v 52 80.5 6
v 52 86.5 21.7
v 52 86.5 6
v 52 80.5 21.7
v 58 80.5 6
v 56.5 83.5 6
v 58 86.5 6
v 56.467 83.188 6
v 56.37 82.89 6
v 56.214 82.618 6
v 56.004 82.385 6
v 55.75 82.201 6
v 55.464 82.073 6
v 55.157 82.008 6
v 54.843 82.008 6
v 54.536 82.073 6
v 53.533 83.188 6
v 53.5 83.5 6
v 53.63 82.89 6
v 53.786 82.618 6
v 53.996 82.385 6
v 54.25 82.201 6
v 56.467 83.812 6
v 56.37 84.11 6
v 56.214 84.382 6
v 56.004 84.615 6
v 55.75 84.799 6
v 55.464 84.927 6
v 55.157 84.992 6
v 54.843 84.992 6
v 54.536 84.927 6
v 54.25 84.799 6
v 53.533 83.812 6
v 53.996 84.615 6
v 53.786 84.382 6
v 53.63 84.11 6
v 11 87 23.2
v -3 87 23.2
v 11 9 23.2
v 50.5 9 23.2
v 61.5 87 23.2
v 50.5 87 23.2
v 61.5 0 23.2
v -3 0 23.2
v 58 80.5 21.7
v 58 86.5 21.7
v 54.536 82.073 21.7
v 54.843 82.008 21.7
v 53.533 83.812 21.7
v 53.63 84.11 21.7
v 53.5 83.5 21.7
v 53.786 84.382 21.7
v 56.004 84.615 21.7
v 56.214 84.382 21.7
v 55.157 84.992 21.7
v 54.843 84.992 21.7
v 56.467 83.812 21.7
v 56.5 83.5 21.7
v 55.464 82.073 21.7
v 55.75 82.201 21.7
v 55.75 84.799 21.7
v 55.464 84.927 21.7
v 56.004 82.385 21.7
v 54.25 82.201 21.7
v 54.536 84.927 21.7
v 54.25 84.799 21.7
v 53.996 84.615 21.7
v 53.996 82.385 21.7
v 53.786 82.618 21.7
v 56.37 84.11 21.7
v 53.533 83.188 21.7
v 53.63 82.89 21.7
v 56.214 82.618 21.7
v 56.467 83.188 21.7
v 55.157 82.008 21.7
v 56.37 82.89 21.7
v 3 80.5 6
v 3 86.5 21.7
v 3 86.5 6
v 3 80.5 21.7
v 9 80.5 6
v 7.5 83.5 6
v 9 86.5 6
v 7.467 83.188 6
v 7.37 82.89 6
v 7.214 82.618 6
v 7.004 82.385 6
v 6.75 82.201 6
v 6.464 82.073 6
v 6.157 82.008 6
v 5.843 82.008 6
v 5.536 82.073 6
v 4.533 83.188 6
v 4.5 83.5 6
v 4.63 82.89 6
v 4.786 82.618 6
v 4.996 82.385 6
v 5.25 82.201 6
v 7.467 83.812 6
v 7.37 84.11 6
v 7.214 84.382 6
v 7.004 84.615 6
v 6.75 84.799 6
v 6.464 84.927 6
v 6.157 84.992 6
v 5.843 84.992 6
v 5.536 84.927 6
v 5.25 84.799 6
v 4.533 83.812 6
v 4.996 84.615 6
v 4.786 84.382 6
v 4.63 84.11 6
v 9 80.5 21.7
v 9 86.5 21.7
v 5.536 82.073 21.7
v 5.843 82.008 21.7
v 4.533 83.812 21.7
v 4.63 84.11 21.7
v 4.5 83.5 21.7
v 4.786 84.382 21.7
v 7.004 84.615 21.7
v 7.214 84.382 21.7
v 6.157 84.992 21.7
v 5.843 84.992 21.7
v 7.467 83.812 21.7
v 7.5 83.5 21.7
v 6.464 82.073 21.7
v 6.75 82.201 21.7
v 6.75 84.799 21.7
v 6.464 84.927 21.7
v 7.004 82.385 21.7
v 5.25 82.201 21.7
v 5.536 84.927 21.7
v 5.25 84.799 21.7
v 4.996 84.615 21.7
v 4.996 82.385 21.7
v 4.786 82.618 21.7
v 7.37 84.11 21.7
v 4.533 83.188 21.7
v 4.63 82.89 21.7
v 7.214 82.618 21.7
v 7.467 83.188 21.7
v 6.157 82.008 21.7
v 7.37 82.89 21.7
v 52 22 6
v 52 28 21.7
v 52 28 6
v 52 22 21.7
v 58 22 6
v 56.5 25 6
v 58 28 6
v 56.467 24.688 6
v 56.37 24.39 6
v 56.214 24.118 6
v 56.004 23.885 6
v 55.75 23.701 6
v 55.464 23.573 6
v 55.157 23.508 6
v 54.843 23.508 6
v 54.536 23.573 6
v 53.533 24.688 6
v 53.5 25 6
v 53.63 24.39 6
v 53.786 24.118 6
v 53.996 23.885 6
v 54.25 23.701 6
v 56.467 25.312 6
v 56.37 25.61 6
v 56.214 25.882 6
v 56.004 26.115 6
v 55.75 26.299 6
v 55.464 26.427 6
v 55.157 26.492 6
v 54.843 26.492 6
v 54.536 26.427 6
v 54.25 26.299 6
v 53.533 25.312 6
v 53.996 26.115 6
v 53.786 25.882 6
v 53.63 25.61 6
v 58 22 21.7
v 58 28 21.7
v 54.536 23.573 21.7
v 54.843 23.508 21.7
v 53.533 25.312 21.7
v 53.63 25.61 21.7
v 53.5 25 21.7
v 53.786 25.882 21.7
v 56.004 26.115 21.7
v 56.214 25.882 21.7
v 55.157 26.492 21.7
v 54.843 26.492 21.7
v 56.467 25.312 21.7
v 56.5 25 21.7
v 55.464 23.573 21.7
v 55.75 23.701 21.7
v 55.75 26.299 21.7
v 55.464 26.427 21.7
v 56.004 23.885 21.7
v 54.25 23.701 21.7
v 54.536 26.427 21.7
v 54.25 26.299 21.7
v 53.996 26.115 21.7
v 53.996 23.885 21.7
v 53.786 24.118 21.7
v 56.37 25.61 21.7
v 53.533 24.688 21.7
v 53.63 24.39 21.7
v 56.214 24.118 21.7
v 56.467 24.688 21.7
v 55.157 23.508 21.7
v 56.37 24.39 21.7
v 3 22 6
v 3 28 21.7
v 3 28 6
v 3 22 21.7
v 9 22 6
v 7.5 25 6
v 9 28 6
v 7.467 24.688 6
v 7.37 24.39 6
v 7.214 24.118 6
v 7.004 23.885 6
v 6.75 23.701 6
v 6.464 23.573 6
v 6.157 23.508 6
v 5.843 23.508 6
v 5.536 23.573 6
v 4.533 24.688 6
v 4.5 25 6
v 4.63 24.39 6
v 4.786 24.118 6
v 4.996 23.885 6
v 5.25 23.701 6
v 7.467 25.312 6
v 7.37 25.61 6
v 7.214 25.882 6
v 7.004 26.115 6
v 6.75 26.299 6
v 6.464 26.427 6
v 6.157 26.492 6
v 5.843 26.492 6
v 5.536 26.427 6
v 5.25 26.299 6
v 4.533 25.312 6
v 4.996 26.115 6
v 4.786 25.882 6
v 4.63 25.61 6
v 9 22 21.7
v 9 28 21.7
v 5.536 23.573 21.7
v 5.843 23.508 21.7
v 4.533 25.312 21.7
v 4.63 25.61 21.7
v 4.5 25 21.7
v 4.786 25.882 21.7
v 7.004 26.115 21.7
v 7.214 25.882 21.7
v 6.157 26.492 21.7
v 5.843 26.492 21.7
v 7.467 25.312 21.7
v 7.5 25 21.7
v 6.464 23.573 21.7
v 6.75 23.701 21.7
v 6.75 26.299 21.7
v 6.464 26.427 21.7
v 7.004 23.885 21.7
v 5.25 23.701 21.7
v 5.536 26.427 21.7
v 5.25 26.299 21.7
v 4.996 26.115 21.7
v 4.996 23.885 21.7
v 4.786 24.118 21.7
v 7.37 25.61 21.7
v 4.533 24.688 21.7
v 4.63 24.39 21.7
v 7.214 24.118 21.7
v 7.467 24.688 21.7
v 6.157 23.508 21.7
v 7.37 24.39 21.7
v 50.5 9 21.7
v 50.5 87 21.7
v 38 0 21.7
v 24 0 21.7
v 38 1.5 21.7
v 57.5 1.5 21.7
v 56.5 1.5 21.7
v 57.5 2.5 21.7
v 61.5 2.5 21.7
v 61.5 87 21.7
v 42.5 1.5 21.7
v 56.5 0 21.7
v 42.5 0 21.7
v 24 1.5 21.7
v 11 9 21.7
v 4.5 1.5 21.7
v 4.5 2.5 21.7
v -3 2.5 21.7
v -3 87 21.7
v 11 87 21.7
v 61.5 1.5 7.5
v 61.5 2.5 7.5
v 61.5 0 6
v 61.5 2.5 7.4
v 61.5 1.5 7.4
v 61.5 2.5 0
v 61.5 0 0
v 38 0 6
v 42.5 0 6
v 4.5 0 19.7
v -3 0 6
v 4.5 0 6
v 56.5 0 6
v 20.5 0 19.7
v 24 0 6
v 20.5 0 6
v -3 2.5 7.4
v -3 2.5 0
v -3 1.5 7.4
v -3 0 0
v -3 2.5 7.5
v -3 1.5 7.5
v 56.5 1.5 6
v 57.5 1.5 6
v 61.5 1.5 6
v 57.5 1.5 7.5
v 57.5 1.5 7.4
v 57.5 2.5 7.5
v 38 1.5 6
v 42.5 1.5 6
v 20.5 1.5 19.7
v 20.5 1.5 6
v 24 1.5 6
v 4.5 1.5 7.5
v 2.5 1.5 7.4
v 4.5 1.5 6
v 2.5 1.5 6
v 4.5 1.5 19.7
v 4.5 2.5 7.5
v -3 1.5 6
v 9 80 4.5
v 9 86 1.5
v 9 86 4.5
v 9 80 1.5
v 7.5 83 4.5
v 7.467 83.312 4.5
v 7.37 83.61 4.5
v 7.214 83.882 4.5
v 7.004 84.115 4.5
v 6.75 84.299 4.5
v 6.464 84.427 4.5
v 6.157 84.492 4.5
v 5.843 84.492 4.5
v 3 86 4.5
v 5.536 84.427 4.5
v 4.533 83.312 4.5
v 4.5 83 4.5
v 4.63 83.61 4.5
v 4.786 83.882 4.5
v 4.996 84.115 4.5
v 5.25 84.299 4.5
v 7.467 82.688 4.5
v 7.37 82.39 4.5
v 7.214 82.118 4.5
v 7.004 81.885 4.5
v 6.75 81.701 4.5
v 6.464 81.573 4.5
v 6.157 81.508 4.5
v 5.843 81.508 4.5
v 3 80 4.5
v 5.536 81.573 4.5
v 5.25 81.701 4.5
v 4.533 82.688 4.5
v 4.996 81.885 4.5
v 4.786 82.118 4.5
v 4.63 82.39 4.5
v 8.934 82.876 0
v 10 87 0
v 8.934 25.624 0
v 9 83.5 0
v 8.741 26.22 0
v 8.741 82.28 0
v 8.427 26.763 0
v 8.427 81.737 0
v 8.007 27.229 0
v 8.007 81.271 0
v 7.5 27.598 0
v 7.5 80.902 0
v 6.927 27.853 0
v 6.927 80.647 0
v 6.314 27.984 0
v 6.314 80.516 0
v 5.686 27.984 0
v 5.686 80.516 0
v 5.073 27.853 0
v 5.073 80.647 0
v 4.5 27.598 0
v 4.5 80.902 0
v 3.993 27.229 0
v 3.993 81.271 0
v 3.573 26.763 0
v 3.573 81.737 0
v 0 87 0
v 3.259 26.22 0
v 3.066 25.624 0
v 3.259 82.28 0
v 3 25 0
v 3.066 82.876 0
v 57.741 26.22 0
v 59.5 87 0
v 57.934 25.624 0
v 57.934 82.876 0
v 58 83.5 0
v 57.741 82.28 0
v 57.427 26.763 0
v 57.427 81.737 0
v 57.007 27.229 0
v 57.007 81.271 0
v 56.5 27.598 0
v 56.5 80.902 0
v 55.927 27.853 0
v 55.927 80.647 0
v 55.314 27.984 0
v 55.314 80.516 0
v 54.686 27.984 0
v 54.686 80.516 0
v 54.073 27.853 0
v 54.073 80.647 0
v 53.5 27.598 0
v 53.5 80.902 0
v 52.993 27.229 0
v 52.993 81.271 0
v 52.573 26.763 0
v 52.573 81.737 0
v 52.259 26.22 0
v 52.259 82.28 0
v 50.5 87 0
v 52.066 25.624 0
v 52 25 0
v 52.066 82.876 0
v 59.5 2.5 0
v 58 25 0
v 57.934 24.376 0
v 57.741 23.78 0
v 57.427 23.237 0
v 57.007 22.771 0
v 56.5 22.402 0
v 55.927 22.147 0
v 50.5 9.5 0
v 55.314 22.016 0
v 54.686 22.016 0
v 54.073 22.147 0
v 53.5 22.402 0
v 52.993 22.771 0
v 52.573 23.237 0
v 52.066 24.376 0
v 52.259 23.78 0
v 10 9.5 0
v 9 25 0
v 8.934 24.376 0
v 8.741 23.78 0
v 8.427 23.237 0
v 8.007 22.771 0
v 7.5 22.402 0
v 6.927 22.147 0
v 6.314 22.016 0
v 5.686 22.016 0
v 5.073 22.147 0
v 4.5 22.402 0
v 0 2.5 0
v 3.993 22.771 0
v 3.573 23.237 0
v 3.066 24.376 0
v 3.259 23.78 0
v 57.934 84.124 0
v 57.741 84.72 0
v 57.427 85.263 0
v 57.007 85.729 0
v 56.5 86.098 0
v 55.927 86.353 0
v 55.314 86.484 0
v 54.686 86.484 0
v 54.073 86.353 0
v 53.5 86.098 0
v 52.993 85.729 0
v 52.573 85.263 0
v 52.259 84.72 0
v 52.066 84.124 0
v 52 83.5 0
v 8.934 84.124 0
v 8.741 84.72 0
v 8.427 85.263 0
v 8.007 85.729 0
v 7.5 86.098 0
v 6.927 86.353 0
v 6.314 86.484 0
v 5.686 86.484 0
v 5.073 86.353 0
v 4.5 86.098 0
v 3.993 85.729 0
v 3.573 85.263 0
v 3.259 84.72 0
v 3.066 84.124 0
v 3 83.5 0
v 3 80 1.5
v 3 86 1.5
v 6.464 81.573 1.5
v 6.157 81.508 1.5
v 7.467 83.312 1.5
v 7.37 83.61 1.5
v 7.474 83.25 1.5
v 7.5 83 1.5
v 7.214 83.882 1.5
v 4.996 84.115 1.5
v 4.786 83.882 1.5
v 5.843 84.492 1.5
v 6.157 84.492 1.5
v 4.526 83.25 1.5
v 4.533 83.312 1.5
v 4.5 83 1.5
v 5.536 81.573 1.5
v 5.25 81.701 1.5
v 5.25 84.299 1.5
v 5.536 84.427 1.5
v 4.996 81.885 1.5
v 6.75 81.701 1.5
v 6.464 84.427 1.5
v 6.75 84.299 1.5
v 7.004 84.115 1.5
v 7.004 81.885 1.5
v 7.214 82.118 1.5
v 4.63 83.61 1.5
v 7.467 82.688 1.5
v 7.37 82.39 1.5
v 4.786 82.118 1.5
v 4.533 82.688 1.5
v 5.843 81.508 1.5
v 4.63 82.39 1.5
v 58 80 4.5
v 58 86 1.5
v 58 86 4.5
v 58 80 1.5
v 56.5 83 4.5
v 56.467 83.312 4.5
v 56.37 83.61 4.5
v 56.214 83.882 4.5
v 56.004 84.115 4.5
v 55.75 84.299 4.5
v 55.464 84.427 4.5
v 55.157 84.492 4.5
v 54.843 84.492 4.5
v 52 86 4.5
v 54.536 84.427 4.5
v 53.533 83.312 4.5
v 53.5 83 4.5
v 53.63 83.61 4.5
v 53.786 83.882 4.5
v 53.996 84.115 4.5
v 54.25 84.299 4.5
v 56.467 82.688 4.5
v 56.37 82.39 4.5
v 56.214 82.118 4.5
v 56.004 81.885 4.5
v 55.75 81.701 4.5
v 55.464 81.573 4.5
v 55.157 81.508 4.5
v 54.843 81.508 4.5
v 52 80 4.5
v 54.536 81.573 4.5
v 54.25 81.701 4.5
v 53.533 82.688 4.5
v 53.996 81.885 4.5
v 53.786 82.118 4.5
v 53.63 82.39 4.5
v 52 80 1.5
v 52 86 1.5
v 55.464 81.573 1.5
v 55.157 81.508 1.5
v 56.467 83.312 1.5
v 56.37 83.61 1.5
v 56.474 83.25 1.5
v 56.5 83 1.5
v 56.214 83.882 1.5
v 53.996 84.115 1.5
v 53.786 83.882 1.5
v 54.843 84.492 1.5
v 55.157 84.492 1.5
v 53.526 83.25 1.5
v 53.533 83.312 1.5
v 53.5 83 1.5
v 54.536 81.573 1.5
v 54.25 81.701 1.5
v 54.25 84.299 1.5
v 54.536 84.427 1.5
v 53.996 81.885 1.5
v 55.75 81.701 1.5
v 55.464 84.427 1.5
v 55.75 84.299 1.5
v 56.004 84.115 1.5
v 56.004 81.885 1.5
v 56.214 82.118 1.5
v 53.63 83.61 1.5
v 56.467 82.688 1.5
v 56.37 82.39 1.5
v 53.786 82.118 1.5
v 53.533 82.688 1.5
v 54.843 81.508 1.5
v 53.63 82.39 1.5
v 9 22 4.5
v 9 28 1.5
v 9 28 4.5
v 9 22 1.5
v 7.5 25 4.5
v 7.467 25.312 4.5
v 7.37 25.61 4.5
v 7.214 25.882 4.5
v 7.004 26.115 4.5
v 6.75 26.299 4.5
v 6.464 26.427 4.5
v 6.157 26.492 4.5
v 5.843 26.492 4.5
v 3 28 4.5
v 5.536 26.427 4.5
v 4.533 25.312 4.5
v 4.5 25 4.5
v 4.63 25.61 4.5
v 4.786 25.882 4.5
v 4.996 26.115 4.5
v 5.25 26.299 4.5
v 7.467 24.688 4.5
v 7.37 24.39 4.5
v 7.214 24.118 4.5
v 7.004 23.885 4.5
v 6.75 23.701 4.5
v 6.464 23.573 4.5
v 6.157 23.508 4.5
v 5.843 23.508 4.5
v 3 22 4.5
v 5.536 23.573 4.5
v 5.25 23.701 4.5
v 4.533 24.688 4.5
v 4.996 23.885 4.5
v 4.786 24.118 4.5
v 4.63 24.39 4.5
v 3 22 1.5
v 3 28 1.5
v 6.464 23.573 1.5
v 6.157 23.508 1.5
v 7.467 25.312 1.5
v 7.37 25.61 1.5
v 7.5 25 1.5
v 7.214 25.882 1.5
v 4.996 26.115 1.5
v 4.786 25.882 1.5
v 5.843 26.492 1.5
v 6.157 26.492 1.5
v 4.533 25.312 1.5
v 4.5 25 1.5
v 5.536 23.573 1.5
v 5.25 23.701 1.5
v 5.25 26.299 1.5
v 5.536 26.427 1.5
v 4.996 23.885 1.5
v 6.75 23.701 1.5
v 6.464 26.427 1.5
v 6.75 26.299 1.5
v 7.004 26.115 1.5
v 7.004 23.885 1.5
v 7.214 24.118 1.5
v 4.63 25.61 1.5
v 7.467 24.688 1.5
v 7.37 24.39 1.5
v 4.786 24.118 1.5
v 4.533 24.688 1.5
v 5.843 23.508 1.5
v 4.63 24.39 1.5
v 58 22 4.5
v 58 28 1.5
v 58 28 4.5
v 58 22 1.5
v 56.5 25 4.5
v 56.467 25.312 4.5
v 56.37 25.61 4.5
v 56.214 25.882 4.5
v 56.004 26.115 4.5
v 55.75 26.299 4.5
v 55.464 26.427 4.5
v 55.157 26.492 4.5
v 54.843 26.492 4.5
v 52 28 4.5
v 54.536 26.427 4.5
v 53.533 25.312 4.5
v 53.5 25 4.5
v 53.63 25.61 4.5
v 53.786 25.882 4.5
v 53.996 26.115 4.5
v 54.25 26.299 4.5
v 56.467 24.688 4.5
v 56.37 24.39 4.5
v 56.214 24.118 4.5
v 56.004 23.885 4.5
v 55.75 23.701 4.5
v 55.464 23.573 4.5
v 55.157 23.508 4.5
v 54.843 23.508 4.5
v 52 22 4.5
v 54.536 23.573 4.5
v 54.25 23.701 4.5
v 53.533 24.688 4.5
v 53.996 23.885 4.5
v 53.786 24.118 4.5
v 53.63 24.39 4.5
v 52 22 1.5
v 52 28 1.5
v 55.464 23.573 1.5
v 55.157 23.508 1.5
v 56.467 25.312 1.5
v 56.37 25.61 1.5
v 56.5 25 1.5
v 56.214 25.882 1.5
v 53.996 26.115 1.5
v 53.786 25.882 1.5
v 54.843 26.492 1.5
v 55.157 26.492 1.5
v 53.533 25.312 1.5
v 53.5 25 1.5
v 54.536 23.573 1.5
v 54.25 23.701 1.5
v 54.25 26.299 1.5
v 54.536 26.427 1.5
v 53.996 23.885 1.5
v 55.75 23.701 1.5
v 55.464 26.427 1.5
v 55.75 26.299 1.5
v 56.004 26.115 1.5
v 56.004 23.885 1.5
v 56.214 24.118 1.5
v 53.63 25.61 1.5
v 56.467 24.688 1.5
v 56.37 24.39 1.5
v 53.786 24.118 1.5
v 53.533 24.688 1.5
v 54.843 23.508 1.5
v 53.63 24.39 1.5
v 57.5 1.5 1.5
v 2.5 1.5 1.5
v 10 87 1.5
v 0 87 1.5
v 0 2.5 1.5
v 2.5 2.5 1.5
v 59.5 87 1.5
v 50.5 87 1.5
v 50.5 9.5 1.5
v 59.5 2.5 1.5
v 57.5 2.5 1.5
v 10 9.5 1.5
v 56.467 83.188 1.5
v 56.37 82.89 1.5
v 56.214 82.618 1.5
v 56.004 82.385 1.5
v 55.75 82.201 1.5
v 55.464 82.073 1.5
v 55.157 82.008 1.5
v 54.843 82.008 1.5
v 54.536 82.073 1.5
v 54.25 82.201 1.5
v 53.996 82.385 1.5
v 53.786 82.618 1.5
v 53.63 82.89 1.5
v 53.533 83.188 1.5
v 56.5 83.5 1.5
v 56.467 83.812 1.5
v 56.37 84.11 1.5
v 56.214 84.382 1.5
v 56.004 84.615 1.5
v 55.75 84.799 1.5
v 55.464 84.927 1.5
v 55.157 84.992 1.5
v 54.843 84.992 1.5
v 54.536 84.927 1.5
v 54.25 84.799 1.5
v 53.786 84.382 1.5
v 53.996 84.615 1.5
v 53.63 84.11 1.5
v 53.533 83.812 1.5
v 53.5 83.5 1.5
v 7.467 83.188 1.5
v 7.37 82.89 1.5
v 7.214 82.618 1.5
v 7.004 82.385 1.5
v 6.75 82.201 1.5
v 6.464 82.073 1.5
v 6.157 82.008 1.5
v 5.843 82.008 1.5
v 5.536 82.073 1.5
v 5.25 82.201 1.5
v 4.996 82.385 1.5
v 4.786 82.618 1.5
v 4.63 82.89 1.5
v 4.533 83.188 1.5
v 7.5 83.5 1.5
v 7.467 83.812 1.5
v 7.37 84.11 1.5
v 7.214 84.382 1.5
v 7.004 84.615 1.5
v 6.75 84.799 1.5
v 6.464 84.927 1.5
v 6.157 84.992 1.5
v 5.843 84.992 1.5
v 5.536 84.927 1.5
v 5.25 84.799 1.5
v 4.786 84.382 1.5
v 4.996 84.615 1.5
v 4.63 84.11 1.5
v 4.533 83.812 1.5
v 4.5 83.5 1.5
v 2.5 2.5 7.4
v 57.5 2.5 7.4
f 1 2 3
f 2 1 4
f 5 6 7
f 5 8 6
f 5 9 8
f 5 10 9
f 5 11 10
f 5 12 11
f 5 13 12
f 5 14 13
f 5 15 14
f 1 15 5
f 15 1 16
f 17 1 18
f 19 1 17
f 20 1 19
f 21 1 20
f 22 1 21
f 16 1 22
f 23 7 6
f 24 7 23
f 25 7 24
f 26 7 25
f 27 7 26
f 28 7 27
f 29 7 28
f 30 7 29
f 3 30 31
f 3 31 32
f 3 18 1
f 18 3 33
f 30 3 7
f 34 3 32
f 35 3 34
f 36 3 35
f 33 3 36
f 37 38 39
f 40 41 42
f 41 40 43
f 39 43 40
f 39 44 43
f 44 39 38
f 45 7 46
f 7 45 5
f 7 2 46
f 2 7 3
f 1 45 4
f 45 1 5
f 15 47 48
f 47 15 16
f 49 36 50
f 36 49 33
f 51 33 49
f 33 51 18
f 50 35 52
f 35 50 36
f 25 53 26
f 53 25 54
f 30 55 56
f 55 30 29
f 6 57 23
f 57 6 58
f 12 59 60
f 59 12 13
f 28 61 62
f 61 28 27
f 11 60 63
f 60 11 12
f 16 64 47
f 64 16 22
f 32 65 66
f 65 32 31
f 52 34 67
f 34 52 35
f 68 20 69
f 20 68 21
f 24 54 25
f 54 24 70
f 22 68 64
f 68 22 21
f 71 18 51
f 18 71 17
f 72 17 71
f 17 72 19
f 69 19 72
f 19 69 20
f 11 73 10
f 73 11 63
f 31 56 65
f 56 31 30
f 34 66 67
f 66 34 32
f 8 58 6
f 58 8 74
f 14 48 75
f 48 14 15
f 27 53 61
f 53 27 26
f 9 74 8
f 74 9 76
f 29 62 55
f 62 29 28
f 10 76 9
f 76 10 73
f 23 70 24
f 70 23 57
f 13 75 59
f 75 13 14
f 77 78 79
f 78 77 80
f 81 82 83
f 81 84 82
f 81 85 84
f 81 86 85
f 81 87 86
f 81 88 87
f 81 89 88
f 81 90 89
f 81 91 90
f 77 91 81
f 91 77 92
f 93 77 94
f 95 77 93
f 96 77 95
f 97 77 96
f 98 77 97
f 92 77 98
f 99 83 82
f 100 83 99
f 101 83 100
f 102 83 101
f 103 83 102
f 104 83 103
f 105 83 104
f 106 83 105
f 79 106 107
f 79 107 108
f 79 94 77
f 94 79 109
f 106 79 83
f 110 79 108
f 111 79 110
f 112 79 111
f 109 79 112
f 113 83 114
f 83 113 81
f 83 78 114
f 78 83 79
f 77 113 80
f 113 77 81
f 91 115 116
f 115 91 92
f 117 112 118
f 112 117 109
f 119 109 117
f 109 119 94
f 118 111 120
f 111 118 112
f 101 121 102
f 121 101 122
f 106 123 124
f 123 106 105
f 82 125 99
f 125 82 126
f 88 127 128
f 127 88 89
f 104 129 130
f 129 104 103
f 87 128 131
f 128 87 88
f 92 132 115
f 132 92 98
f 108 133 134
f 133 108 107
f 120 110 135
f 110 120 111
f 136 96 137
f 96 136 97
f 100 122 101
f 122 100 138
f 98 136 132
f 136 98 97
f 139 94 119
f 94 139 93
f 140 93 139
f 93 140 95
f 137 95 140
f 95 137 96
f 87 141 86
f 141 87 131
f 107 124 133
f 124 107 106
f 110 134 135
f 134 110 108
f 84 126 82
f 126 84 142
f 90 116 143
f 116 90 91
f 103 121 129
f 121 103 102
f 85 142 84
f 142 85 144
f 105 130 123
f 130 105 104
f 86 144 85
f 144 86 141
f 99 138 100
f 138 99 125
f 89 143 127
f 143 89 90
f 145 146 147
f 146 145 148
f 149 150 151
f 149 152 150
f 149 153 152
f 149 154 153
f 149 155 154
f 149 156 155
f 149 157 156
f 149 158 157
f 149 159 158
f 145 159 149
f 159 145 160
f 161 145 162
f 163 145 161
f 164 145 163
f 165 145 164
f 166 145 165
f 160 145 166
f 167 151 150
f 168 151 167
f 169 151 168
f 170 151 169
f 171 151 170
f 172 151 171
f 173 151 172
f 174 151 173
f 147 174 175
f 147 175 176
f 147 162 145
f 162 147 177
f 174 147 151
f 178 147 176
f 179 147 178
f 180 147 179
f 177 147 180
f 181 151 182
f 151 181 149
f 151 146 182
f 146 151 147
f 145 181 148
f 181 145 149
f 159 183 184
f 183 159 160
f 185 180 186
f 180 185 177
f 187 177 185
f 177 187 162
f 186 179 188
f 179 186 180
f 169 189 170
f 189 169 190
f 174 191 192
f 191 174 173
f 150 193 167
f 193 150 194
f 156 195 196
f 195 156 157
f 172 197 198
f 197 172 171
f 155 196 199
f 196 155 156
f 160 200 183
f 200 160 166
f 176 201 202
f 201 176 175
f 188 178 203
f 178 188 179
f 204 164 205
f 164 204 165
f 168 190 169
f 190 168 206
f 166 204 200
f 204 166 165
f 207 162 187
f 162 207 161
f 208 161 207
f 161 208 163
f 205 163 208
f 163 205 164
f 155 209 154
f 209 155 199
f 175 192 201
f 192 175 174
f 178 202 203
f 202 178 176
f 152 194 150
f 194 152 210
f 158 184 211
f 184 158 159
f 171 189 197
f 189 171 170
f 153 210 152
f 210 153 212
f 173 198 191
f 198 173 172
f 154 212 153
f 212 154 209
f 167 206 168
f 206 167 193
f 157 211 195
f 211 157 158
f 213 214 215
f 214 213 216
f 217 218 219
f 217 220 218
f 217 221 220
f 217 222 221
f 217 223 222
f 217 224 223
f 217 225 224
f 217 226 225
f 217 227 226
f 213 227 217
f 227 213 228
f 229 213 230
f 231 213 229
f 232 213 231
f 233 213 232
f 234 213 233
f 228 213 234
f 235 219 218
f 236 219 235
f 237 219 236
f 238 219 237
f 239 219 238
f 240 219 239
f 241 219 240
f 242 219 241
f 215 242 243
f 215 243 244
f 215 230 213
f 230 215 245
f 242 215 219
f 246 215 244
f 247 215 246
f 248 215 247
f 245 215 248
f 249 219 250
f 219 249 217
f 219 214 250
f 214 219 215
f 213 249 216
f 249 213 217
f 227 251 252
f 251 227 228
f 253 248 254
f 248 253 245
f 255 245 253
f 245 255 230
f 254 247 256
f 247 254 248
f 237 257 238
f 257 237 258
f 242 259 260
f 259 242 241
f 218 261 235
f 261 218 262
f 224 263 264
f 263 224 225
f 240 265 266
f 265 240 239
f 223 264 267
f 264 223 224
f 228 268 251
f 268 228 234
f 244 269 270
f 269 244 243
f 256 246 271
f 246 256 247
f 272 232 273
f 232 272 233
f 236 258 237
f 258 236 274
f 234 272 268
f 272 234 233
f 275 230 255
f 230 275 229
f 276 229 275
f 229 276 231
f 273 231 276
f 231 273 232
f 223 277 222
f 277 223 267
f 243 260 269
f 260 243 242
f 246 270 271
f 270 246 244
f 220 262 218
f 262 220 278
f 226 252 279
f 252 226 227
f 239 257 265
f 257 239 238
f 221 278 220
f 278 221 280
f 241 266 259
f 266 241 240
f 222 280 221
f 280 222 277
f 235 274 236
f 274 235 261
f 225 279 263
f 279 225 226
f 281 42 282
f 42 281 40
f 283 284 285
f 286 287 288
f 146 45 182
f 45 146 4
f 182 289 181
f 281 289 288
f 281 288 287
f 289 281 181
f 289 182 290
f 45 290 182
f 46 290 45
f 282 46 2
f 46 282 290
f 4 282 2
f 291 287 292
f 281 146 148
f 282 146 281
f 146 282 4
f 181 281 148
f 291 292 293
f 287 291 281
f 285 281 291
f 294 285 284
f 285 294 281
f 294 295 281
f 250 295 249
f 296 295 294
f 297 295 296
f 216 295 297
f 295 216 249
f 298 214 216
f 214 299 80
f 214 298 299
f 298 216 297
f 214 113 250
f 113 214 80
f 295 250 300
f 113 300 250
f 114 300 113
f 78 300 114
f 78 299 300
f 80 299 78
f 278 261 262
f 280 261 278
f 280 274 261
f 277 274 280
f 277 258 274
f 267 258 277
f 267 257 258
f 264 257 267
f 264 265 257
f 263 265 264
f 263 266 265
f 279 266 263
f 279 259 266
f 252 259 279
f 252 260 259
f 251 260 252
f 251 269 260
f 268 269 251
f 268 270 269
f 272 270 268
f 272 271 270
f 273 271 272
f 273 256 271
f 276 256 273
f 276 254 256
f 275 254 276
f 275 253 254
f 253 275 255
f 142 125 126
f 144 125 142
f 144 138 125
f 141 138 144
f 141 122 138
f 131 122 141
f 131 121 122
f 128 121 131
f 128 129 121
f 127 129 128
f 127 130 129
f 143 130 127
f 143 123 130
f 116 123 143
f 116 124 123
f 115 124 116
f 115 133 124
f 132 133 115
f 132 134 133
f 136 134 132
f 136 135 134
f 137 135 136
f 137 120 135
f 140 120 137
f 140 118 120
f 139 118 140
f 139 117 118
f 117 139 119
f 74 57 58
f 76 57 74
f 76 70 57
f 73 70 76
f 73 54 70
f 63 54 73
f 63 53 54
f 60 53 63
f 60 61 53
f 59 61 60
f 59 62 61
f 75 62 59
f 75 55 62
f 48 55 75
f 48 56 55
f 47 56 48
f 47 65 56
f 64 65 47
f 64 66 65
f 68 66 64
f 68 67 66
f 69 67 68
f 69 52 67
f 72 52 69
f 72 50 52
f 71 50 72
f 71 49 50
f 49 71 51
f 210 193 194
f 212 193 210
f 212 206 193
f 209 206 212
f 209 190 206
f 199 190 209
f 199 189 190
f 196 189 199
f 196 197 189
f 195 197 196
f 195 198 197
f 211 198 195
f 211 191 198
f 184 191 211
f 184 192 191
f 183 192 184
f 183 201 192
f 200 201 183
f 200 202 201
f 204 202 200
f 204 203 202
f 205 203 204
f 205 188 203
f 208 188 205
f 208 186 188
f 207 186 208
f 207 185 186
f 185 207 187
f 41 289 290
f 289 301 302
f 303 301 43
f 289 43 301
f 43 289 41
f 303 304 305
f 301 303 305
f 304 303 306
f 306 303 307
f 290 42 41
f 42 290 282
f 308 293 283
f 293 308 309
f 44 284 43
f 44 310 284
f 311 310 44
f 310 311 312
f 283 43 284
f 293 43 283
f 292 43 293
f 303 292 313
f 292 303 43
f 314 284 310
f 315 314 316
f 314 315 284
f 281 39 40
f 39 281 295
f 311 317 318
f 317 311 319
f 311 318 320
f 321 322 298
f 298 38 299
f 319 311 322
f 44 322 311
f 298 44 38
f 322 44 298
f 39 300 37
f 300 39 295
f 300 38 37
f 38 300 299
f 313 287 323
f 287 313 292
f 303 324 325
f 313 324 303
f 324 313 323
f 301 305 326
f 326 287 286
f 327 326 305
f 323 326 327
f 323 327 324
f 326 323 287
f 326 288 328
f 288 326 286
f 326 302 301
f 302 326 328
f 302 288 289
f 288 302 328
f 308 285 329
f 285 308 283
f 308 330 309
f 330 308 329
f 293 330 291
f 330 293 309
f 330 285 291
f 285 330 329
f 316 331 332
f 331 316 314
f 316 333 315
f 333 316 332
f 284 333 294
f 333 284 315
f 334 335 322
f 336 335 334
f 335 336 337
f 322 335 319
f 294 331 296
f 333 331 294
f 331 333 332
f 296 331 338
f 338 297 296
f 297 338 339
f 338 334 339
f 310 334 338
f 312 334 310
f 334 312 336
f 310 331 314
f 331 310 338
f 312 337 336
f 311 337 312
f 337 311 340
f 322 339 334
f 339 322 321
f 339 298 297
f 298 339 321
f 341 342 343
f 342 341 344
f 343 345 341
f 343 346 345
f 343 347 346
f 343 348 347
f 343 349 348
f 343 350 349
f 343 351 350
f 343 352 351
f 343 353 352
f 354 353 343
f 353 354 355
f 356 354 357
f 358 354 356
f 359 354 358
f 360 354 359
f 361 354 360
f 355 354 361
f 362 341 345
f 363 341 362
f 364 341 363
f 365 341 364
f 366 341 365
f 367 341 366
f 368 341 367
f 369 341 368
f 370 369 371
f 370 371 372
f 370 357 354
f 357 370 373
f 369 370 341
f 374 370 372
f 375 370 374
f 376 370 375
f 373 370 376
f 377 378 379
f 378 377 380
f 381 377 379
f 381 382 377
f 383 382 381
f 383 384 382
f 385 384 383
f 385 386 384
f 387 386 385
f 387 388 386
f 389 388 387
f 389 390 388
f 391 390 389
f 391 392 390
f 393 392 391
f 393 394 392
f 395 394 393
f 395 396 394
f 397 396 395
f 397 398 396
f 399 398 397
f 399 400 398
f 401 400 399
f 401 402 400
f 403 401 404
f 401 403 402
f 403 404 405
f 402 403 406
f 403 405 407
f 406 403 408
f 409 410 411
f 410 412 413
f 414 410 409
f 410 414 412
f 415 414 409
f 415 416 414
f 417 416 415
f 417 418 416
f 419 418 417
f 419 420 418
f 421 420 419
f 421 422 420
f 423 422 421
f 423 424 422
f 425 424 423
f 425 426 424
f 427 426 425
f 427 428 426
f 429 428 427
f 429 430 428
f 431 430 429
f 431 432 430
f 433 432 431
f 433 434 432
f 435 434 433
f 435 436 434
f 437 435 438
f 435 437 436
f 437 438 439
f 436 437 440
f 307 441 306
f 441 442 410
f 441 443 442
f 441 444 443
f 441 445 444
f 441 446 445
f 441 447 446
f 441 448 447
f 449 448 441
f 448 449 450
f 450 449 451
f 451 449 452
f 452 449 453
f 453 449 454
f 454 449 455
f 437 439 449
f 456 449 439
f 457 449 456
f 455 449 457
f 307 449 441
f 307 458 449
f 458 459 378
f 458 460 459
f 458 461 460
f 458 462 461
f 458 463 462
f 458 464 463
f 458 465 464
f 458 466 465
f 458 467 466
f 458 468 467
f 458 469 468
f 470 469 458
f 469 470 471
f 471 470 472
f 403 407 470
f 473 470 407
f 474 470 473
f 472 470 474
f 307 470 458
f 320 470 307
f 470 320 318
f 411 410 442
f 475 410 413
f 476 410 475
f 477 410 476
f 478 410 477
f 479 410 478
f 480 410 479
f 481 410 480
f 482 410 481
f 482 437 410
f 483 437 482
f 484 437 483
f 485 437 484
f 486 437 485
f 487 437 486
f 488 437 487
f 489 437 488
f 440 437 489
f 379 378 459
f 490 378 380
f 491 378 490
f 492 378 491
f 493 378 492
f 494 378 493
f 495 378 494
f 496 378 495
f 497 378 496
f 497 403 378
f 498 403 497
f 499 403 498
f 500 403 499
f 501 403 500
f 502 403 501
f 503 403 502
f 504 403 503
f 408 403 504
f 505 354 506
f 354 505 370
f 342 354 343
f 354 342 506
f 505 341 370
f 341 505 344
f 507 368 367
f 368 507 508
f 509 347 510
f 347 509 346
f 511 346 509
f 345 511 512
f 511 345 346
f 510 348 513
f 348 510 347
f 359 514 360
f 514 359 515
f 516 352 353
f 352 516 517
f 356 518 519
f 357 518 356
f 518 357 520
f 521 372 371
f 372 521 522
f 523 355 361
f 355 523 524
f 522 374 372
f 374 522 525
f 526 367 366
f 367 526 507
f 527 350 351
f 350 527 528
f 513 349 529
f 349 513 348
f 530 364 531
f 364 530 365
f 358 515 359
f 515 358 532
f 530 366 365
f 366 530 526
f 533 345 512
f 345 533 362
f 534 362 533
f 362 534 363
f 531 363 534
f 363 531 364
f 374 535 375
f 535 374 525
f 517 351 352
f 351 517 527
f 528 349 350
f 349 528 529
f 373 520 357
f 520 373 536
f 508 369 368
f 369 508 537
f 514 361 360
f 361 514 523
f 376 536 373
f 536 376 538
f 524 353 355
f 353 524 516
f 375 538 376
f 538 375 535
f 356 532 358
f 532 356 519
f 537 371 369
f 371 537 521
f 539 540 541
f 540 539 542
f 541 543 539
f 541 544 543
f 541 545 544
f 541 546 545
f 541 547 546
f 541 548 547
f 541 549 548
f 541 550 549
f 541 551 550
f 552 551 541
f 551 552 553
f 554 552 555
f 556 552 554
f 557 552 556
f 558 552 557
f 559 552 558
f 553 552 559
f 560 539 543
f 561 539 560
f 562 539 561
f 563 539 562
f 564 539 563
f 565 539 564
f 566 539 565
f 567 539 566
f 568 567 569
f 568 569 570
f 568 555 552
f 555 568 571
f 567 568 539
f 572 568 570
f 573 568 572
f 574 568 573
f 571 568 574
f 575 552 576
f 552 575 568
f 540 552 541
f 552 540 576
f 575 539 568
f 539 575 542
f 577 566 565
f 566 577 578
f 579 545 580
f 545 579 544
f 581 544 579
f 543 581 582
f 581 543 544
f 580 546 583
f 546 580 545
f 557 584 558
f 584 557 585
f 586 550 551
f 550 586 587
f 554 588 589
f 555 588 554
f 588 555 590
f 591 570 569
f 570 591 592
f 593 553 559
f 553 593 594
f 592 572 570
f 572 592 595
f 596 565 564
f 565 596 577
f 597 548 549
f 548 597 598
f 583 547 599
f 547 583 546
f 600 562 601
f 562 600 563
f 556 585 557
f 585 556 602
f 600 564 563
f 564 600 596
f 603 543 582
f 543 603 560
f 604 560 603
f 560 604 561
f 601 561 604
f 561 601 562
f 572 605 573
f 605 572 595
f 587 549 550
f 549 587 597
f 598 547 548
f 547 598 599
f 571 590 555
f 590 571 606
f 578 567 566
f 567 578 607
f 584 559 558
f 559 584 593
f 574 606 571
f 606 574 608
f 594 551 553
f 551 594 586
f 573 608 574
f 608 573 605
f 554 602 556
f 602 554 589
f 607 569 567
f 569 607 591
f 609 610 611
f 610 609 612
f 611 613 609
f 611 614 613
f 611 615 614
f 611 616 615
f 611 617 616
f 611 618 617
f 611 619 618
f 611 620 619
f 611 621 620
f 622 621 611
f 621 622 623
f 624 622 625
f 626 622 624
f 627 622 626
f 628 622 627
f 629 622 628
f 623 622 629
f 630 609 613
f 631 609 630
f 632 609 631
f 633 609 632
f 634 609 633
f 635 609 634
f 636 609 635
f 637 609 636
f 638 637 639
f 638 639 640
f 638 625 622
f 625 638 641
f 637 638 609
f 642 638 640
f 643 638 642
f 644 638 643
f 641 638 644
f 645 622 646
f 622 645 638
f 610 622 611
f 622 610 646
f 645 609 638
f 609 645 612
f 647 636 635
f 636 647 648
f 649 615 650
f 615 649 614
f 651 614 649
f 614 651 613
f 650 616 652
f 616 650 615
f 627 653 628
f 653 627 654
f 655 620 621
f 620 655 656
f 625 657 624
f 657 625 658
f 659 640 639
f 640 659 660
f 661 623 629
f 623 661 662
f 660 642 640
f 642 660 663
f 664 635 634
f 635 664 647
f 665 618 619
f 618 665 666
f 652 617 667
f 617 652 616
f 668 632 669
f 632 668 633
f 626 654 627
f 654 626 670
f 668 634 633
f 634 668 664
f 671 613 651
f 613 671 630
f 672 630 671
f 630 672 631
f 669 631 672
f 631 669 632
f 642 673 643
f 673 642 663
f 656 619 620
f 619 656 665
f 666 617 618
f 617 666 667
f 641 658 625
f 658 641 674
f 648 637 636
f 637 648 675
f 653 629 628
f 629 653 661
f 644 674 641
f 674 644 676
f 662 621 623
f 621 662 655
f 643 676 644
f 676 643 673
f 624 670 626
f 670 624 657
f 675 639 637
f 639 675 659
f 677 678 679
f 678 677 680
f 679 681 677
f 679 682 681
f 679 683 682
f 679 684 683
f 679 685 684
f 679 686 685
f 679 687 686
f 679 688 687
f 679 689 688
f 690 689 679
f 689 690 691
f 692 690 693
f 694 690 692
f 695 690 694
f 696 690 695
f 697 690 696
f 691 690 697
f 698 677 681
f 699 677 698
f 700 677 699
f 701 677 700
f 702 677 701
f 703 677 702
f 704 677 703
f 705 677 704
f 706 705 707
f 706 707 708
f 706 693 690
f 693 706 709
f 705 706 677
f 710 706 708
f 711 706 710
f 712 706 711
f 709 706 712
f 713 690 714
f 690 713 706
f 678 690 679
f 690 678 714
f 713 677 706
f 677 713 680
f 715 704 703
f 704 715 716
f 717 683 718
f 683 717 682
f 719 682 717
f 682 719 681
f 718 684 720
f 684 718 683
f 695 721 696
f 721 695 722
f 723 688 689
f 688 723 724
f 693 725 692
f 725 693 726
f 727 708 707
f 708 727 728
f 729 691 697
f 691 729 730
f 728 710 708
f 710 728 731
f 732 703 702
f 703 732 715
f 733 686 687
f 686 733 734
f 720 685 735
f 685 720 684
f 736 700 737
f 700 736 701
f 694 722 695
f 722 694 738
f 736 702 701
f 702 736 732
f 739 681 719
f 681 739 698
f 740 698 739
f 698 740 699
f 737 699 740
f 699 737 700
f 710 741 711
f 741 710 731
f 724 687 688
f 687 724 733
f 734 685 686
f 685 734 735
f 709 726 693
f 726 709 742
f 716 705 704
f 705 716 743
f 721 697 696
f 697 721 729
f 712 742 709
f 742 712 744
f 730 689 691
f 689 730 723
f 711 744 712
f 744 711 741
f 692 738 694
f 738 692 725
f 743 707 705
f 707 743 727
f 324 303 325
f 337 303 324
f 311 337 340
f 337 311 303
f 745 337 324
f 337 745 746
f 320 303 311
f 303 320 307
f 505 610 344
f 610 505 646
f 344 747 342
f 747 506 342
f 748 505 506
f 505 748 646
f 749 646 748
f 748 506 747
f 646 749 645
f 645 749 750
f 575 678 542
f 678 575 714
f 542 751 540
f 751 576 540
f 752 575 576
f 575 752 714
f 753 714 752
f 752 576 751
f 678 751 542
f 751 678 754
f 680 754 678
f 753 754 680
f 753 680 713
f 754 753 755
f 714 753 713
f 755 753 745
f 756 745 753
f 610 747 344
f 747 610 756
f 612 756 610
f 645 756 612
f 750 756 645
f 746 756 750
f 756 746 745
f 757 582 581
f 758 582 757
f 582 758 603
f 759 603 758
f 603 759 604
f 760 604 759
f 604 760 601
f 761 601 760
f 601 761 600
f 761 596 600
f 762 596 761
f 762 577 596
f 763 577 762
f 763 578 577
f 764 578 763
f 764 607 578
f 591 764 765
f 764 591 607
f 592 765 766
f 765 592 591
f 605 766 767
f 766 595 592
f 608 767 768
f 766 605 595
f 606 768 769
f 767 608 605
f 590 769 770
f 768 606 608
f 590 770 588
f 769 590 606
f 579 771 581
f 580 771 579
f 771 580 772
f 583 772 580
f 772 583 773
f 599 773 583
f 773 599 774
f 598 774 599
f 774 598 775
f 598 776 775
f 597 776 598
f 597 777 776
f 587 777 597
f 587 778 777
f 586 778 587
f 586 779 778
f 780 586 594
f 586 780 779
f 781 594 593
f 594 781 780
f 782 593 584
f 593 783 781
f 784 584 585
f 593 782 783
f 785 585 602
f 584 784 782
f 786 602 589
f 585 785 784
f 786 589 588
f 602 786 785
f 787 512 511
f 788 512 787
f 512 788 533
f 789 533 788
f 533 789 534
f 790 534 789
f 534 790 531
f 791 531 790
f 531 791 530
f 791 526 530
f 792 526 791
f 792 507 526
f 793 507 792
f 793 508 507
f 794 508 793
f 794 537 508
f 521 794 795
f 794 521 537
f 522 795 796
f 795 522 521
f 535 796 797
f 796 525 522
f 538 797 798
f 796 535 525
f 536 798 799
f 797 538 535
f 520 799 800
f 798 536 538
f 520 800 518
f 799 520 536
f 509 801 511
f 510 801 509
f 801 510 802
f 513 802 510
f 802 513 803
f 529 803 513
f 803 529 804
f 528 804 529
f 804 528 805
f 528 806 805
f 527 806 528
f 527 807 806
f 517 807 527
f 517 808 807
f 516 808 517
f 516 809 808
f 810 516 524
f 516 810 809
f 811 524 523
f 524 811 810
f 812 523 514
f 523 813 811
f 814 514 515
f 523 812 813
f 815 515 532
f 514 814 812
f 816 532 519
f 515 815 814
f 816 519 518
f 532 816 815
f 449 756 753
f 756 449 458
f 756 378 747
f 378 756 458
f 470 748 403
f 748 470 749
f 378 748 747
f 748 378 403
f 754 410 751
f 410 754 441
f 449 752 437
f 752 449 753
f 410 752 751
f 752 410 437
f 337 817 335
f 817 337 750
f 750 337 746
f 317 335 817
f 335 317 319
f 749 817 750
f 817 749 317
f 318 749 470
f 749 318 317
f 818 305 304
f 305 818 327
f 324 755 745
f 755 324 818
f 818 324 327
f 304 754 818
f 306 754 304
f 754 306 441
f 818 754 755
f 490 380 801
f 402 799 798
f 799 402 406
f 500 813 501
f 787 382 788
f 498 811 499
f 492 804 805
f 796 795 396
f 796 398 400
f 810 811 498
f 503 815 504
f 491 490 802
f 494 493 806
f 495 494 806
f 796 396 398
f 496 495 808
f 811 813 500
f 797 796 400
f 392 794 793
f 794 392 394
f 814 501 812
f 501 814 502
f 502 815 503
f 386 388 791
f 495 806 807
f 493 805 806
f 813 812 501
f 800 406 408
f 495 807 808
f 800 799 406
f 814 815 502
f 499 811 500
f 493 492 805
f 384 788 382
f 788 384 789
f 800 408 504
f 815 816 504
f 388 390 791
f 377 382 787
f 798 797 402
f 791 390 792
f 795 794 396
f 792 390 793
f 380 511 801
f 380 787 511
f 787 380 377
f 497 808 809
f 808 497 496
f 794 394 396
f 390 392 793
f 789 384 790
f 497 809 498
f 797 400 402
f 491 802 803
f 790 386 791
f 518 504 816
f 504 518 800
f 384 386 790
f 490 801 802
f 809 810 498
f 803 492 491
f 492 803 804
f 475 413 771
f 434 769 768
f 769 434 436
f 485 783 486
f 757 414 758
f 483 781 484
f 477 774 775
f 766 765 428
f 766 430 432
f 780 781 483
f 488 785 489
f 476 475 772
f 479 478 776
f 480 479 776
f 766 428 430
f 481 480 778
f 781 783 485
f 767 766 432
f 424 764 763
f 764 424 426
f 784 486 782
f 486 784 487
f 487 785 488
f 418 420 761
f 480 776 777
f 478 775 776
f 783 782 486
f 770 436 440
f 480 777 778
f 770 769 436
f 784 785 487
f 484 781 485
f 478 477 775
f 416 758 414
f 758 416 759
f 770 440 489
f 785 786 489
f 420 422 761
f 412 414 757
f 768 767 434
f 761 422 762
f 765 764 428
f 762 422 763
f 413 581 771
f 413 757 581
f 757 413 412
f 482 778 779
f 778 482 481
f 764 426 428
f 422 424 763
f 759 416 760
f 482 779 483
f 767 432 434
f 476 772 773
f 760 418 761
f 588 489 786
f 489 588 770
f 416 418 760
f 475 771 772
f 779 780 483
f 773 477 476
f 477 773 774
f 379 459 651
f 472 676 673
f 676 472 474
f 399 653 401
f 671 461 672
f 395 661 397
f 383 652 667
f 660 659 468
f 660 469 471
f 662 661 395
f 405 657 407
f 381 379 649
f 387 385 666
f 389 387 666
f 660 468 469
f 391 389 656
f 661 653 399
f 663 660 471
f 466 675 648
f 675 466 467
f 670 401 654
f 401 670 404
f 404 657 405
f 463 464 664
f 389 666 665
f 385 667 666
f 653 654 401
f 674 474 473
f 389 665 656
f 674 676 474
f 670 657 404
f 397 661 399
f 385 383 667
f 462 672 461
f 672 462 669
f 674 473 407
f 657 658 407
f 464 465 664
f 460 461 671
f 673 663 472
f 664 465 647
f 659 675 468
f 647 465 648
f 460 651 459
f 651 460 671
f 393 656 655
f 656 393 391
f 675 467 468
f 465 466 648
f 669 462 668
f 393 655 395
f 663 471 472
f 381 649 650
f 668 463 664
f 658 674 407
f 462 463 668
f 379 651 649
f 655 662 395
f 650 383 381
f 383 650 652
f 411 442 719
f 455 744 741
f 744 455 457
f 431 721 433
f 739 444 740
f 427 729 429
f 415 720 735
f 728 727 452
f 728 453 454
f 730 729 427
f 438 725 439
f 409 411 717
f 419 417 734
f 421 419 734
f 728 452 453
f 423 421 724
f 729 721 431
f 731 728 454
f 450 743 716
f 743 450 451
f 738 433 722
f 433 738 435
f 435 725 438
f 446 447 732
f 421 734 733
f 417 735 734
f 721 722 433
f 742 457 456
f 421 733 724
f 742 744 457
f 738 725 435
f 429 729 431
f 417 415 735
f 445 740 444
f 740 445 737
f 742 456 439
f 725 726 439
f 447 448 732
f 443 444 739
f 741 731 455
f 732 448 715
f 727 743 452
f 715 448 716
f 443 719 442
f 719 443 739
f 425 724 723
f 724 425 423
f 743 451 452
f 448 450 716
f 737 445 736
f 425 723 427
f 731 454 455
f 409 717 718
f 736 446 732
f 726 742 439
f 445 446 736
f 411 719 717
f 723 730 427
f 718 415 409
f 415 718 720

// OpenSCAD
usbheight=15.7;
usboff1=2;
usboff2=4.5;
usboff3=3.5;
ethheight=13.7;
ethoff1=2.5;
usbwid=14;
ethwid=16;
width=55.5;
length=87;
backheight=3;
boardheight=1.5;
od=6;
id=3;
$fs=0.1;
poff=22;

module pillar(h1) {
	difference() {
		cube([od,od,h1]);
		translate([od/2,od/2,0]) cylinder(d=id,h=h1);
	}
}

module platter() {
	translate([-3,0,0]) cube([od+5,length,boardheight]);
	cube([width,od+3,boardheight]);
//	translate([-3,length-od-2,0]) cube([width,od+2,boardheight]);
	translate([width-od-2,0,0]) cube([od+8,length,boardheight]);
	translate([-3,0,0]) cube([3+usboff1,boardheight,usbheight+boardheight]);
	translate([-3,boardheight,0]) cube([4,1,usbheight+boardheight*2-3]);
	translate([usboff1+usbwid,0,0]) cube([usboff2,boardheight,usbheight+boardheight]);
	translate([usboff1+usboff2+2*usbwid,0,0]) cube([usboff3,boardheight,usbheight+boardheight]);
	translate([usboff1+usboff2+usboff3+2*usbwid,0,0]) cube([ethwid,boardheight,usbheight-ethheight+boardheight]);
	translate([usboff1+usboff2+usboff3+2*usbwid+ethwid,0,0]) cube([ethoff1+5,boardheight,usbheight+boardheight]);
	translate([usboff1+usboff2+usboff3+2*usbwid+ethwid,boardheight,0]) cube([5+ethoff1,1,usbheight+boardheight*2-3]);
	translate([0.5,length-od-0.5,0]) pillar(usbheight+boardheight);
	translate([width-od,length-od-0.5,0]) pillar(usbheight+boardheight);
	translate([0.5,poff,0]) pillar(usbheight+boardheight);
	translate([width-od,poff,0]) pillar(usbheight+boardheight);
}

module lid() {
	difference() {
		union() {
			translate([-6,0,0]) cube([width+9,boardheight,boardheight*2+backheight]);
			translate([0,length-od-1,0]) pillar(backheight+boardheight);
			translate([width-od-0.5,length-od-1,0]) pillar(backheight+boardheight);
			translate([0,poff,0]) pillar(backheight+boardheight);
			translate([width-od-0.5,poff,0]) pillar(backheight+boardheight);
			translate([-2,0,0]) cube([width+2,boardheight+od+2,boardheight]);
			translate([-3,0,0]) cube([od+4,length,boardheight]);
			translate([width-od-2,0,0]) cube([od+3,length,boardheight]);
			translate([-6,boardheight,0]) cube([3+ethoff1,1,boardheight+backheight+2.9]);
			translate([width-1,boardheight,0]) cube([4,1,boardheight+backheight+2.9]);
		}
		translate([od/2,length-0.5-od/2,0]) cylinder(d1=od,d2=id,h=boardheight);
		translate([width-od/2-0.5,length-0.5-od/2,0]) cylinder(d1=od,d2=id,h=boardheight);
		translate([od/2,poff+od/2,0]) cylinder(d1=od,d2=id,h=boardheight);
		translate([width-od/2-0.5,poff+od/2,0]) cylinder(d1=od,d2=id,h=boardheight);
	}
}

module unit() {
translate ([width+3,0,usbheight+boardheight*3+backheight]) rotate([0,180,0]) platter();
//translate ([width+3*od+10,length+10+od,0]) rotate([0,0,180]) platter();

//translate ([3,boardheight,boardheight+backheight]) cube([width,length,boardheight]);

translate([3,0,0]) lid();
}

module fan(d) {
	difference() {
		cube([d,d,20]);
		translate([d/2,d/2,0]) cylinder(d=d-1,h=20);
	}
}

module printable_unit() {
	translate ([width+3*od+10,length+10+od,0]) rotate([0,0,180]) platter();
	translate([3,0,0]) lid();
}

module rack() {
for (i=[0:7])
	translate([0,0,(boardheight*3+backheight+usbheight)*i])
		unit();
for (i=[0:1])
	translate([-8,boardheight+1,92*i+2]) rotate([0,270,0]) fan(90);
}

//printable_unit();
unit();
//rack();
